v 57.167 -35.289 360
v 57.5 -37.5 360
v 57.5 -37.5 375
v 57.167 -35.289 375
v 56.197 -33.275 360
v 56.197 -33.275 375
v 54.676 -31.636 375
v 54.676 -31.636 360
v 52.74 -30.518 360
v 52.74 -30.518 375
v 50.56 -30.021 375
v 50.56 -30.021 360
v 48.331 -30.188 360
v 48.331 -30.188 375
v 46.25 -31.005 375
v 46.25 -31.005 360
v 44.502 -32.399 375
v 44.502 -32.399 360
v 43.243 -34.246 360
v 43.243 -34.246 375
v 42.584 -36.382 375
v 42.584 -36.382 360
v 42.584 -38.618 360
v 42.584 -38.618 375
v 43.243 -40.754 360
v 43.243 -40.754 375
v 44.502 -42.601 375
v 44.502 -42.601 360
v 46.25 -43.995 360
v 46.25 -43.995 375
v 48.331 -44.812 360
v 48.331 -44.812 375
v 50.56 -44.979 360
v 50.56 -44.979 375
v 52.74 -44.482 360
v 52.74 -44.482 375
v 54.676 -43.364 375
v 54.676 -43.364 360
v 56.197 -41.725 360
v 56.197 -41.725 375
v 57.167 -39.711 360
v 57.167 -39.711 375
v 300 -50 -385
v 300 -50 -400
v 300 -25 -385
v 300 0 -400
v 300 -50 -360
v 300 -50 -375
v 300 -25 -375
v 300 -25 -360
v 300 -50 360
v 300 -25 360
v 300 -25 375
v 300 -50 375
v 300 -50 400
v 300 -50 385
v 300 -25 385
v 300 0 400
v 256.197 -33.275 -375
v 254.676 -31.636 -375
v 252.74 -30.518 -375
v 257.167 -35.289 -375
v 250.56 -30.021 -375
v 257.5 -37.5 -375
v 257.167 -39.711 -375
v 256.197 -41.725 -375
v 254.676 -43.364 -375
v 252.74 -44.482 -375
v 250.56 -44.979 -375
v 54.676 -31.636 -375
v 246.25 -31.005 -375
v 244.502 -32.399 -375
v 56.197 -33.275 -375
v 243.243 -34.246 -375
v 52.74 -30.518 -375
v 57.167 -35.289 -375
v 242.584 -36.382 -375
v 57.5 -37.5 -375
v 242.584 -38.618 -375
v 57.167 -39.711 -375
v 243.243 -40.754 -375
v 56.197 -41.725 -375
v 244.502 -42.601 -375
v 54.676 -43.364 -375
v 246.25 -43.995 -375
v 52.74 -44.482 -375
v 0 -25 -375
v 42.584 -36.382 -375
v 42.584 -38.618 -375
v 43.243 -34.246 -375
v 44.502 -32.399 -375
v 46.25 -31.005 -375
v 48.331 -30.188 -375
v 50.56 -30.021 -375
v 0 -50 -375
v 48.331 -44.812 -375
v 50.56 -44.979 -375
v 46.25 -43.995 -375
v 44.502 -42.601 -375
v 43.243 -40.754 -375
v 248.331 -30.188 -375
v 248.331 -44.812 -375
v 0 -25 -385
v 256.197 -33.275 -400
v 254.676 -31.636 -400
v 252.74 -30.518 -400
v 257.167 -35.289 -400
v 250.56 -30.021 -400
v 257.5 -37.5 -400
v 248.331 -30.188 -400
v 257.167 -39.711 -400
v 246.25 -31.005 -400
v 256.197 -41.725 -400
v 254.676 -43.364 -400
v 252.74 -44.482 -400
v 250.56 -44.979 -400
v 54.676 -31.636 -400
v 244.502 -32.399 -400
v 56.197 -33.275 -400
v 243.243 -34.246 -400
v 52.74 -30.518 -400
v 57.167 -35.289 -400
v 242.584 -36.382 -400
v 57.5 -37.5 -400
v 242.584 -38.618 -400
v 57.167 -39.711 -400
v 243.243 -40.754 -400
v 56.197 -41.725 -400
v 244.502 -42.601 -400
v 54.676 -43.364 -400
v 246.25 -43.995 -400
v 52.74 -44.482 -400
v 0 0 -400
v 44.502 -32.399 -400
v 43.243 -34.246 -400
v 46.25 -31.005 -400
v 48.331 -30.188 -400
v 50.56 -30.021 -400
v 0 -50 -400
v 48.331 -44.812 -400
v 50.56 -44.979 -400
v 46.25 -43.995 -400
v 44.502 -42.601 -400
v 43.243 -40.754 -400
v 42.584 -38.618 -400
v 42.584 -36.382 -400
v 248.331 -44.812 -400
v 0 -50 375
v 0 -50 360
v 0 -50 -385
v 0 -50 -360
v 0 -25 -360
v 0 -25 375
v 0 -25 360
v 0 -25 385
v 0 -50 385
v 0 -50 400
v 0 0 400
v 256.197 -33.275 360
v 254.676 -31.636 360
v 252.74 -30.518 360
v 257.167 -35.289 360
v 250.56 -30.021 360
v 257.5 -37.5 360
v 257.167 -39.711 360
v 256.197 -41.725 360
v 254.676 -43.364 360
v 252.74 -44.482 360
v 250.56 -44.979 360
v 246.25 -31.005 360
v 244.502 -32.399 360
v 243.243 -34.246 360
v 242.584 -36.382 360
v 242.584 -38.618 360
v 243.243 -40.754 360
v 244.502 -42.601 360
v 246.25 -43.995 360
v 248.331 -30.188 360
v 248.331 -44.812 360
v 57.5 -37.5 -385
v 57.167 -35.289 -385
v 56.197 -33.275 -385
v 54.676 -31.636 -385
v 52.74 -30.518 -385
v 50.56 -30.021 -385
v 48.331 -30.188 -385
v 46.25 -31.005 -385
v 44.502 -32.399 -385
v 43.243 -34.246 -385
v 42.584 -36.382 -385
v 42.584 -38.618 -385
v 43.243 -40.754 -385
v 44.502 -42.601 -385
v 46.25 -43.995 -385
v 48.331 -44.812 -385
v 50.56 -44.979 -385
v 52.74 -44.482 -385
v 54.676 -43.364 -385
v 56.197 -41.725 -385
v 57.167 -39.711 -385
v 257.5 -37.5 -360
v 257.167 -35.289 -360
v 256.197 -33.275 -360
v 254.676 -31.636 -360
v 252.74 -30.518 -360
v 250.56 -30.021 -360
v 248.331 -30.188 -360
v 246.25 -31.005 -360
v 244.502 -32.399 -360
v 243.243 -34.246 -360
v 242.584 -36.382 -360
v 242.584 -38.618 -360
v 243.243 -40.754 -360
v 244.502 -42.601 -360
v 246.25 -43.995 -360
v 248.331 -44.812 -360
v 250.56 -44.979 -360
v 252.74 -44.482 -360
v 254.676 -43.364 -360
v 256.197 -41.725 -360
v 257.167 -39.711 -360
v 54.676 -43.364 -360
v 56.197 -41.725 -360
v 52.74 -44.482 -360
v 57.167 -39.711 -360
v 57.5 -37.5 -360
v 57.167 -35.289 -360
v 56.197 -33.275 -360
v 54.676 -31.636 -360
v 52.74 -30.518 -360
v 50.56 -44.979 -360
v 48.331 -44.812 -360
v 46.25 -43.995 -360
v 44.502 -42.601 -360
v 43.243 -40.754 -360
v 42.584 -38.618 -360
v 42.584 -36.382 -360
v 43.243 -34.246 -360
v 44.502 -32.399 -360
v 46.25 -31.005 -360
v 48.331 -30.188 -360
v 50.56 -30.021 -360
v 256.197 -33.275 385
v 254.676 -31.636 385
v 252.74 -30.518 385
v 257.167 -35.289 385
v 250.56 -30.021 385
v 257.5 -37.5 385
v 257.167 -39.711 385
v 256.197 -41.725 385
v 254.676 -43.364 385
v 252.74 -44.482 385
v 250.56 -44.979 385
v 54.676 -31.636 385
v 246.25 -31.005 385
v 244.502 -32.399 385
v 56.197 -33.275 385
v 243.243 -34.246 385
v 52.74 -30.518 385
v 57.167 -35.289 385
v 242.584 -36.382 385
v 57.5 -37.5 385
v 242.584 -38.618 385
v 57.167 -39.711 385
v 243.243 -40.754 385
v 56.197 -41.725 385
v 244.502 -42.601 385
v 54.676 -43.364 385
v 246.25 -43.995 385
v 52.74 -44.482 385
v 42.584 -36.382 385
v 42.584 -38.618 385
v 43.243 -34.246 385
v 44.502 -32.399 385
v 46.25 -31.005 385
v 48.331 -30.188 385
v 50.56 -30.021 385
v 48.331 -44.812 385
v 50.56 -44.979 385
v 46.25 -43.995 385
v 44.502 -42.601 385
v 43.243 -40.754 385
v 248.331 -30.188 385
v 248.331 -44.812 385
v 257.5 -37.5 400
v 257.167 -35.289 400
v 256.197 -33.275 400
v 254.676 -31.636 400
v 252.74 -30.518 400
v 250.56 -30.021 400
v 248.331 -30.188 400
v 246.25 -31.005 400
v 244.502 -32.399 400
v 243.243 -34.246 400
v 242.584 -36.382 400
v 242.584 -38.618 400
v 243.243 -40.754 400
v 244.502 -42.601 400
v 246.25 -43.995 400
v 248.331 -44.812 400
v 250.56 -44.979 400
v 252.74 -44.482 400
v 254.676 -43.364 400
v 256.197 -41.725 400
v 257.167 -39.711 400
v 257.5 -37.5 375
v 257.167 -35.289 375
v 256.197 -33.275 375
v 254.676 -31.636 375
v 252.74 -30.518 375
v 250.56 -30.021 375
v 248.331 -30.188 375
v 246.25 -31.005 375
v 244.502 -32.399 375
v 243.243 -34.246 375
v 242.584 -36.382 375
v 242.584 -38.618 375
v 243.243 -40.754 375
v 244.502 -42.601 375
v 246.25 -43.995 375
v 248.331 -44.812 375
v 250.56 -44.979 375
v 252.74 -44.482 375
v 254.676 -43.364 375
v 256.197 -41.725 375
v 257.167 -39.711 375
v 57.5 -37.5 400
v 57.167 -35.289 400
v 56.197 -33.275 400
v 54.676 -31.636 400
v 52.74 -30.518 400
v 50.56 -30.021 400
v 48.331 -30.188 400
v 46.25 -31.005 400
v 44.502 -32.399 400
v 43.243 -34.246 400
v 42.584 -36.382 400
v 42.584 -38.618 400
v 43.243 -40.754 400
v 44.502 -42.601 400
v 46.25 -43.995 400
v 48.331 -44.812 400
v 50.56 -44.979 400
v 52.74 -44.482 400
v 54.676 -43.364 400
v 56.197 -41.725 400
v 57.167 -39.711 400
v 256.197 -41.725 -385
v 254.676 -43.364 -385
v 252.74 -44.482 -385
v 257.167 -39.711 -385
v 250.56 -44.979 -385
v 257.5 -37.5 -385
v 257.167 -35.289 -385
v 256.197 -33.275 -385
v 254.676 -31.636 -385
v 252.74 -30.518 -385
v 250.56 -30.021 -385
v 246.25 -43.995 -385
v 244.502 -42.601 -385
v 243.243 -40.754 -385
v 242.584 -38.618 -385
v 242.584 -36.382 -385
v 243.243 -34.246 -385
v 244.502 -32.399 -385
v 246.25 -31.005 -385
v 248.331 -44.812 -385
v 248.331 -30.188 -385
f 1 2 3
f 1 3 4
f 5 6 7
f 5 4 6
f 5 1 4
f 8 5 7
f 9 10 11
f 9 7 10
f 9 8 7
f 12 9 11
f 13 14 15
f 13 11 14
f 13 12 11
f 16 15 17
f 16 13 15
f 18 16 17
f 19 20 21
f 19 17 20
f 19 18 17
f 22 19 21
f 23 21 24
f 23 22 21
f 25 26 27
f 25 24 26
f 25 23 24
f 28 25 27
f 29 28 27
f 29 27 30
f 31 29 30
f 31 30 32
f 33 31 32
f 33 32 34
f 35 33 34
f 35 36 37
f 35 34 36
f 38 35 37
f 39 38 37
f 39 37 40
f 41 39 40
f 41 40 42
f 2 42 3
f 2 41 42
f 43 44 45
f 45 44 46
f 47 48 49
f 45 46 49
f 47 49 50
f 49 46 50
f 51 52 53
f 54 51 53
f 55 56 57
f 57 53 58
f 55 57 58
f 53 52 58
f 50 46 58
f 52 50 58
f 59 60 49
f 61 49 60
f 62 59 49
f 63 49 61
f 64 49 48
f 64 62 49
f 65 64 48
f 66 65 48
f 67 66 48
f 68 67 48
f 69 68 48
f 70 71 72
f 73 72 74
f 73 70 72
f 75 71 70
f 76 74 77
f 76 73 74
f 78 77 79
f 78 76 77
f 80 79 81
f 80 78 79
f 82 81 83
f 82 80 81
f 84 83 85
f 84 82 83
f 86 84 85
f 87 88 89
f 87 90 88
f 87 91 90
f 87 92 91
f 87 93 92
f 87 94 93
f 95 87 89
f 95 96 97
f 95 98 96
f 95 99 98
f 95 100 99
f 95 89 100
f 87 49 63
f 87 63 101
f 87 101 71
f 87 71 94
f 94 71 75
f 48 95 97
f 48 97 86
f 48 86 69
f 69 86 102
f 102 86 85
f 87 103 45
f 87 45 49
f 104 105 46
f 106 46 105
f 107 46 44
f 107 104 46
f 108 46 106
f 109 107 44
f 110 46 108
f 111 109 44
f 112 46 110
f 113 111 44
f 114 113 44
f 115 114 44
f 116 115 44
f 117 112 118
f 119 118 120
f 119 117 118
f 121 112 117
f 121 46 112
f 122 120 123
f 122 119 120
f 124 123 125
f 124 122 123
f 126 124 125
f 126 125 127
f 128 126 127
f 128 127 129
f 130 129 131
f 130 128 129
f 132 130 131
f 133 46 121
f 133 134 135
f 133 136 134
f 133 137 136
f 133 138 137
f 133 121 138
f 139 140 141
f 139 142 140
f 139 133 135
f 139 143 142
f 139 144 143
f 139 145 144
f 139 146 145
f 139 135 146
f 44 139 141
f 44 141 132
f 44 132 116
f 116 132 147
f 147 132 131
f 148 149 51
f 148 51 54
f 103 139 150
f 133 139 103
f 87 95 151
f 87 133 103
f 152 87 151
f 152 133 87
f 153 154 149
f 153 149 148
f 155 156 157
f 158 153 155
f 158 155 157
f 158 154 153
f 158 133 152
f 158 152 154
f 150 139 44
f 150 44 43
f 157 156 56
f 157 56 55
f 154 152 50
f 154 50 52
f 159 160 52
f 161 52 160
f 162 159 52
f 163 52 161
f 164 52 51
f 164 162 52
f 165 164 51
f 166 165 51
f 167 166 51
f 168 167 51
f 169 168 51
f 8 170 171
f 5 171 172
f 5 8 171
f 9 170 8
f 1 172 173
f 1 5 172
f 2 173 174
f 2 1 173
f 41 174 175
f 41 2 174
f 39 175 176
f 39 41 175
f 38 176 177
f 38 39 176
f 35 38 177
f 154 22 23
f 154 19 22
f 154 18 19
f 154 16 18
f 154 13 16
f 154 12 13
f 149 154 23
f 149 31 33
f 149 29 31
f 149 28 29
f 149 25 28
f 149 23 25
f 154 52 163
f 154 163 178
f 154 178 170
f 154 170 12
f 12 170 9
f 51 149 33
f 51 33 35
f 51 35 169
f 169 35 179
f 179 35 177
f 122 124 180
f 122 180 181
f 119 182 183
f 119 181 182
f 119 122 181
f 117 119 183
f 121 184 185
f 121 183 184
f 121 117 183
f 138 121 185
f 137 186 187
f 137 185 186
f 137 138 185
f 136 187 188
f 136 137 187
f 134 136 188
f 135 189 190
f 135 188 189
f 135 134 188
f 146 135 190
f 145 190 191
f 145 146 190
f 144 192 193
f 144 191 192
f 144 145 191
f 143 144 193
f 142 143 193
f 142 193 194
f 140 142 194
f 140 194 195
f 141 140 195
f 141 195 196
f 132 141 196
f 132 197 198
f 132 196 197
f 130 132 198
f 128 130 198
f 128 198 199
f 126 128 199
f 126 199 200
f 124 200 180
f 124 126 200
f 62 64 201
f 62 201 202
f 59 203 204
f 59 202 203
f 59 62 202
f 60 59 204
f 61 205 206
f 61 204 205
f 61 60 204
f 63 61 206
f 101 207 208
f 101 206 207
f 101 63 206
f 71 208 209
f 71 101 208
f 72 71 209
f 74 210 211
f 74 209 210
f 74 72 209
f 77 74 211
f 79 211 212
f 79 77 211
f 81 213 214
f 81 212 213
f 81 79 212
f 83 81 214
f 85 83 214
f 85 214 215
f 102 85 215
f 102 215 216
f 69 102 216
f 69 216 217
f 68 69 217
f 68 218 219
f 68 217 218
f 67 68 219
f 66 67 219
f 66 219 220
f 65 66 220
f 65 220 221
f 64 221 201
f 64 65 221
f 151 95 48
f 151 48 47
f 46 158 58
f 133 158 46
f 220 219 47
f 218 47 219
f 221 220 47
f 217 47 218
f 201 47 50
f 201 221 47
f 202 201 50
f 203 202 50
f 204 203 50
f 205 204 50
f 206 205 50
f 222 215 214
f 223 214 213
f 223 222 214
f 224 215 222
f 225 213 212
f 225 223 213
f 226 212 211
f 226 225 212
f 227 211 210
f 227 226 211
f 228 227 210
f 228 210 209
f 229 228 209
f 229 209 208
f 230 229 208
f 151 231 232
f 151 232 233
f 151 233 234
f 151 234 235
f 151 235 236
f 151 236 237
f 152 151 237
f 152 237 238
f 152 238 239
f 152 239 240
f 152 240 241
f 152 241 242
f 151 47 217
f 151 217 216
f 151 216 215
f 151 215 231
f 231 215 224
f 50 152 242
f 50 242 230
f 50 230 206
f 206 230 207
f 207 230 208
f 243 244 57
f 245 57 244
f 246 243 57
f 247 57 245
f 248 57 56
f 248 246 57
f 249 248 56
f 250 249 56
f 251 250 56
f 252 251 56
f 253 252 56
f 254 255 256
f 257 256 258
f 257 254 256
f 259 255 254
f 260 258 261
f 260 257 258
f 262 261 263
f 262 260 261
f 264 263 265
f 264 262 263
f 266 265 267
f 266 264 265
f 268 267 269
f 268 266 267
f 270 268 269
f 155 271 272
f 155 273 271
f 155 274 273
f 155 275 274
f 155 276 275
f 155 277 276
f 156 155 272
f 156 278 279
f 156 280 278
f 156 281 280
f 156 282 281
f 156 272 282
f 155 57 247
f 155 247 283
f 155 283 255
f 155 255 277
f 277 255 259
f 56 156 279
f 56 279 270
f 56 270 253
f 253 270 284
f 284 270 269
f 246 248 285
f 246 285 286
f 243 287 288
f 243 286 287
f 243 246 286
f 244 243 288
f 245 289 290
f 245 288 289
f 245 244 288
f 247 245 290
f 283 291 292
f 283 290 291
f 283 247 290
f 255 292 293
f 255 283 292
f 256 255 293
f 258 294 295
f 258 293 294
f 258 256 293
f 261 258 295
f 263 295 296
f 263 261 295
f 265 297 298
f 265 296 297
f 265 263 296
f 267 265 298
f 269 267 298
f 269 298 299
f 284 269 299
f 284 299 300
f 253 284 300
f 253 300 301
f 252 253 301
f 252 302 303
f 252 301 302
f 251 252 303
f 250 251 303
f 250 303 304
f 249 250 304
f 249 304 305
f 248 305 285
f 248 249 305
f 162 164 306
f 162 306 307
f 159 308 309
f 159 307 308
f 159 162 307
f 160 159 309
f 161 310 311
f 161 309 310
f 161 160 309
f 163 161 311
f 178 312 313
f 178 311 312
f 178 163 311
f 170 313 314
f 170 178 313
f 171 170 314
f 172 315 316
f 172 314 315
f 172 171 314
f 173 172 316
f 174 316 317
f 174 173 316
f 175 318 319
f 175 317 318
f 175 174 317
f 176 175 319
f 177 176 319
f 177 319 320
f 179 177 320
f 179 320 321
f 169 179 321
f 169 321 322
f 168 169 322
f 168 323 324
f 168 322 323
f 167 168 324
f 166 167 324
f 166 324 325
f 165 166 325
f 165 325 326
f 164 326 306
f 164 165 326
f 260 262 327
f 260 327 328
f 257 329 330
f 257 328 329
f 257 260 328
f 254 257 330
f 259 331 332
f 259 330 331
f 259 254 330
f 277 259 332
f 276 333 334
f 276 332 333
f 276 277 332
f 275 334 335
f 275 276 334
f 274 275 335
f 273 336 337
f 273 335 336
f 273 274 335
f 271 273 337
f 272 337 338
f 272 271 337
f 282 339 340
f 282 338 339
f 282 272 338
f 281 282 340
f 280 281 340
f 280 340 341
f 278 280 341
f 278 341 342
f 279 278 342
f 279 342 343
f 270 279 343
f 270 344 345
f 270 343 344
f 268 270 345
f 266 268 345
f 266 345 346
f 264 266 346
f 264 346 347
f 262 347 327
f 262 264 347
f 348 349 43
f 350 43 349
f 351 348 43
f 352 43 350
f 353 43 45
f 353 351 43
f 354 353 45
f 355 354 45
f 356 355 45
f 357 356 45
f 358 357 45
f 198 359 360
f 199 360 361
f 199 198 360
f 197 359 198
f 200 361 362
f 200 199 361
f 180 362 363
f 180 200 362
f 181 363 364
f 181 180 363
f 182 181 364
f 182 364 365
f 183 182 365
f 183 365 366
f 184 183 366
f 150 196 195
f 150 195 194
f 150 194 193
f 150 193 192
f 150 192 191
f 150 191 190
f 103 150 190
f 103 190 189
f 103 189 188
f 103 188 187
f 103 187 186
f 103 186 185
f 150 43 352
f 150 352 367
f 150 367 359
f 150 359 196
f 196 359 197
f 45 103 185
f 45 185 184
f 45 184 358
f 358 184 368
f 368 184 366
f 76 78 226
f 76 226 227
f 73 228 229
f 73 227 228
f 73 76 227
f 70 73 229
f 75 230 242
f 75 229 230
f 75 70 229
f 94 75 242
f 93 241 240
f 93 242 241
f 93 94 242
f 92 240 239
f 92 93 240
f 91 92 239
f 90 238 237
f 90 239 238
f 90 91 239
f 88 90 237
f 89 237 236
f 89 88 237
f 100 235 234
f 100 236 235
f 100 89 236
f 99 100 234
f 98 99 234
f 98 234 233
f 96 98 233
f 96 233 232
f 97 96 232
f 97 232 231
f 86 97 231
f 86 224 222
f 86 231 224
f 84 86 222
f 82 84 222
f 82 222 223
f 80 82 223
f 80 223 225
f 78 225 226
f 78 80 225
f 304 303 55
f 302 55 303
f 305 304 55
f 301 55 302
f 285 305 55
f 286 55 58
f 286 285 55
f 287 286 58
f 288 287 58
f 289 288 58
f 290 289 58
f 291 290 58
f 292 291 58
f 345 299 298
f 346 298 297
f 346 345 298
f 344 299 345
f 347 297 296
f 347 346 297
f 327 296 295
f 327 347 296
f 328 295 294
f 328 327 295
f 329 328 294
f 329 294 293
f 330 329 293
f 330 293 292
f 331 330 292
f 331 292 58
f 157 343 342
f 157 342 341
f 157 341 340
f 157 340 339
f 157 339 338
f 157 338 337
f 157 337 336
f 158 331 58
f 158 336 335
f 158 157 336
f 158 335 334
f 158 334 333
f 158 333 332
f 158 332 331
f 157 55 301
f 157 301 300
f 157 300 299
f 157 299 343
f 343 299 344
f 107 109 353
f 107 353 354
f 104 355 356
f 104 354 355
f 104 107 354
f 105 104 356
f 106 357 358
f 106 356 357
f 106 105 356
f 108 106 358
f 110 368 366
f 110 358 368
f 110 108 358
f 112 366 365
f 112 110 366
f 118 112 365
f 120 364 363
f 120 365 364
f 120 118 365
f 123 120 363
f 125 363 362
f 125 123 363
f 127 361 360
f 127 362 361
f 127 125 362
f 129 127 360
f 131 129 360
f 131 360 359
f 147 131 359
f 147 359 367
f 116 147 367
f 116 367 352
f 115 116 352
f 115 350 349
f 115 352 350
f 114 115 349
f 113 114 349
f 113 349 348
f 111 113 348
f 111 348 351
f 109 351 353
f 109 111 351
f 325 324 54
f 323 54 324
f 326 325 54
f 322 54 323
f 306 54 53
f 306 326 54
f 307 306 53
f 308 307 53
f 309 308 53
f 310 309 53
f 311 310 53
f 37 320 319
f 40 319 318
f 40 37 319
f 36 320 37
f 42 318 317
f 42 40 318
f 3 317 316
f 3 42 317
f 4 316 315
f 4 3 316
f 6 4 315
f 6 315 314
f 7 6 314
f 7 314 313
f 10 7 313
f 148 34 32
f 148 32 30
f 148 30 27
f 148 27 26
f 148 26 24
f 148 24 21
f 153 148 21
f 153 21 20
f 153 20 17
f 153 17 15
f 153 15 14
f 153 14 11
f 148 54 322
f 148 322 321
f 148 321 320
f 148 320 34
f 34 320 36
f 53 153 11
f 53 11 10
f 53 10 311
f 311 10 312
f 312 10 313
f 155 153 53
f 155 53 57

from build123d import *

# Parameters (mm, degrees)
BOSS_EXTRUDE1_DEPTH     = 300
CUT_EXTRUDE1_DEPTH      = 856.862138431
CUT_EXTRUDE1_DEPTH_BACK = 856.862138431
SKETCH2_R               = 7.5


with BuildPart() as part:
    # Sketch1 → Boss-Extrude1 (new body)
    with BuildSketch(Plane(origin=(0, 0, 0), x_dir=(0, 0, -1), z_dir=(1, 0, 0))):
        Polygon((-400, 0), (400, 0), (400, -50), (385, -50), (385, -25), (375, -25), (375, -50), (360, -50), (360, -25), (-360, -25), (-360, -50), (-375, -50), (-375, -25), (-385, -25), (-385, -50), (-400, -50), align=None)
    extrude(amount=BOSS_EXTRUDE1_DEPTH)

    # Sketch2 → Cut-Extrude1 (cut, two sides: drawn at the far end of the back side and taken through both)
    with BuildSketch(Plane.XY.offset(400).offset(-CUT_EXTRUDE1_DEPTH_BACK)):
        with Locations((50, -37.5)):
            Circle(SKETCH2_R)
        with Locations((250, -37.5)):
            Circle(SKETCH2_R)
    extrude(amount=CUT_EXTRUDE1_DEPTH + CUT_EXTRUDE1_DEPTH_BACK, mode=Mode.SUBTRACT)


solid = part.part
